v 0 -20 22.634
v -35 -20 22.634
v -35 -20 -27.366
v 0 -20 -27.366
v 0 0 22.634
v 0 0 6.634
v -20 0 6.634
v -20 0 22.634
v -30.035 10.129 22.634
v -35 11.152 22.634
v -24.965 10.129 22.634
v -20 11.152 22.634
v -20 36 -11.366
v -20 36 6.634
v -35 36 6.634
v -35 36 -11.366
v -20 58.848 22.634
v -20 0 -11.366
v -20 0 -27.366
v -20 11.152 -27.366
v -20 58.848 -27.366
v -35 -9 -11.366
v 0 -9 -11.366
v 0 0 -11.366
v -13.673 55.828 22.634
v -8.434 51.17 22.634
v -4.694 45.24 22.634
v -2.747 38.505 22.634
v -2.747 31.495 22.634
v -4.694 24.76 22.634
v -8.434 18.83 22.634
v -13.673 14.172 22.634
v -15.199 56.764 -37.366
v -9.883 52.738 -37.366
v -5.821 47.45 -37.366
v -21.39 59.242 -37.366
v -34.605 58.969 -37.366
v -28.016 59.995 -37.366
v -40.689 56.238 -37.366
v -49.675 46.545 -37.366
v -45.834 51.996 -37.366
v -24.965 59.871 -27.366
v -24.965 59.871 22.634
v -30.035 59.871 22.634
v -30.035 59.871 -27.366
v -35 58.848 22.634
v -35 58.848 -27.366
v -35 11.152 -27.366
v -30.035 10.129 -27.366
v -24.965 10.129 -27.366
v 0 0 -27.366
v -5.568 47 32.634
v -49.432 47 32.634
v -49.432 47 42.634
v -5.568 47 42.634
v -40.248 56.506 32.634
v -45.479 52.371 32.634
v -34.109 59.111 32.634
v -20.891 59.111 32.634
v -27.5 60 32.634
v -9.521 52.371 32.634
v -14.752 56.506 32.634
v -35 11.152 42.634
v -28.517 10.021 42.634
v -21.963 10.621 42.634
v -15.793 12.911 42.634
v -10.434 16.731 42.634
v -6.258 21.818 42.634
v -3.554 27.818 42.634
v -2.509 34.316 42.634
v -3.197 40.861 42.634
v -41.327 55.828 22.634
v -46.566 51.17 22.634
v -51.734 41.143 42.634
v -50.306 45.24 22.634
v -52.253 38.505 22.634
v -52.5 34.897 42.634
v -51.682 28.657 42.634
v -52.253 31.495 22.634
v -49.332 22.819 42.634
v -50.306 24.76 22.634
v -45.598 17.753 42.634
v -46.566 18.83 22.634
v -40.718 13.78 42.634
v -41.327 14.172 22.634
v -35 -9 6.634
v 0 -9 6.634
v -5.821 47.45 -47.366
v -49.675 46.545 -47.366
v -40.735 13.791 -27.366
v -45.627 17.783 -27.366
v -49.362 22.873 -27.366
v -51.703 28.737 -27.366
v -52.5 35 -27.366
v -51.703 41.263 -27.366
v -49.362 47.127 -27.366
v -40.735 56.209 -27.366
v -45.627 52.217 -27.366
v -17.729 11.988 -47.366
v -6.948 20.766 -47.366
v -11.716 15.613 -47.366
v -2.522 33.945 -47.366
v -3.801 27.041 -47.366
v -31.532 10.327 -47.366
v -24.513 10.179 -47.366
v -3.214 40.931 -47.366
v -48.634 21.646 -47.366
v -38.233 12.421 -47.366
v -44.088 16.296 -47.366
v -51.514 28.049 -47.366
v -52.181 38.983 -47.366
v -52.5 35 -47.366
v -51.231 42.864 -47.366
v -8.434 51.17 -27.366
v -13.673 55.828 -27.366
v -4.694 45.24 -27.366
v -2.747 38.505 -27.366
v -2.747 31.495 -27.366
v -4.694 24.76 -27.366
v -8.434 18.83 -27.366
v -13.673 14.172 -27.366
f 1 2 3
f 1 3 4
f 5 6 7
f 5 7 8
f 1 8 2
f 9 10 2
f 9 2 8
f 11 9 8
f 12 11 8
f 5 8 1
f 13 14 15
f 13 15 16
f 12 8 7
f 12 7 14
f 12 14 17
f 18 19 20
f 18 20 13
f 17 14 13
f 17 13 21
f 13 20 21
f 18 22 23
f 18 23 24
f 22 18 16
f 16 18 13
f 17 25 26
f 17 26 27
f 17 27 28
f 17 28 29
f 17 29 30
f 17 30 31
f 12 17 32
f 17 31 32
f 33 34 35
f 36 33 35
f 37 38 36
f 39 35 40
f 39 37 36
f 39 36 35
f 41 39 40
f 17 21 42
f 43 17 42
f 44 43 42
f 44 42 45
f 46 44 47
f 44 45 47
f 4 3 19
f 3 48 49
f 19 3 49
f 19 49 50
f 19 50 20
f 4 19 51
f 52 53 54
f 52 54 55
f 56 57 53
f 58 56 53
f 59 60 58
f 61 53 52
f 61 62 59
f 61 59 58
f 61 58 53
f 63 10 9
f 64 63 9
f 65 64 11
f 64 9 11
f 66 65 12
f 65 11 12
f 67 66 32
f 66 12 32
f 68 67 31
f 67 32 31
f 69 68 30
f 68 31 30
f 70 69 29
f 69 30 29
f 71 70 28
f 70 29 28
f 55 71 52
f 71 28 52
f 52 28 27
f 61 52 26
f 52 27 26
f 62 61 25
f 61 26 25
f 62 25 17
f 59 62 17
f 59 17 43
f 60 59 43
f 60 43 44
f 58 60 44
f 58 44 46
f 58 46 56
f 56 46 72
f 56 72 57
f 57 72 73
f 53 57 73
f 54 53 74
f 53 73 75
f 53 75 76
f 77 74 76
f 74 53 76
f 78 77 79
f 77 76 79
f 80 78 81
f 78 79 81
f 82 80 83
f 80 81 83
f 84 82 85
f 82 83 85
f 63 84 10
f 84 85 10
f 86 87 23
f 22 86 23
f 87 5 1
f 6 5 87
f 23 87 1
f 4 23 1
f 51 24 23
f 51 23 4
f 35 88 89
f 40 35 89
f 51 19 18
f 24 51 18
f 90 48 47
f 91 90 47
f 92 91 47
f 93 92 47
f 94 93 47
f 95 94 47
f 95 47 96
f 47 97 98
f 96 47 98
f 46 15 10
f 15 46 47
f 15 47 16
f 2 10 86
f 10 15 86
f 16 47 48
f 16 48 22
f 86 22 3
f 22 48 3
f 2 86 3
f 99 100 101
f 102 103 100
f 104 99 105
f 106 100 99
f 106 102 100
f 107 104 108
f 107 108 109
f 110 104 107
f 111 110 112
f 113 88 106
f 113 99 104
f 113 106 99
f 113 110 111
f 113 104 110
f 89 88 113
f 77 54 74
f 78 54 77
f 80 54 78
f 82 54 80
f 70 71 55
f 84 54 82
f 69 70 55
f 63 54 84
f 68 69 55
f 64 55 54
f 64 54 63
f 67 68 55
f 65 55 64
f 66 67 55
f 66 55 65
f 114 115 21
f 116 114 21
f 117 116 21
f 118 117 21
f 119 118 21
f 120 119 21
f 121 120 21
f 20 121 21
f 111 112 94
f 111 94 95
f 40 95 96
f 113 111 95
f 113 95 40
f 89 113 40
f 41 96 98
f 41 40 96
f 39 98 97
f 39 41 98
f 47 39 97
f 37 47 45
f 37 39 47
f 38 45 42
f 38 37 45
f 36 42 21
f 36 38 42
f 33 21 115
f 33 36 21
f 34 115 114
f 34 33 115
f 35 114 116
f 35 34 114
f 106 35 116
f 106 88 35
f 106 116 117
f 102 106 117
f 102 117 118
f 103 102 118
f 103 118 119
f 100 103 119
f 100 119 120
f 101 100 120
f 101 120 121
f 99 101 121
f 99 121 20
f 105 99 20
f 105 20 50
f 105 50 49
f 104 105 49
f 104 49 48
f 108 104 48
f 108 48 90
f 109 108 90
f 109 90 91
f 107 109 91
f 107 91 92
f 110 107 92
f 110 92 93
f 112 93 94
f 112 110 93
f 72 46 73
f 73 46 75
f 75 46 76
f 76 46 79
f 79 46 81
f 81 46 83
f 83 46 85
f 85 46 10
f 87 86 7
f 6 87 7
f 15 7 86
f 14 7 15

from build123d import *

# Parameters (mm, degrees)
BOSS_EXTRUDE1_DEPTH = 20
BOSS_EXTRUDE2_DEPTH = 50
SKETCH3_W           = 18
SKETCH3_H           = 45
CUT_EXTRUDE1_DEPTH  = 50
SKETCH4_R           = 25
BOSS_EXTRUDE3_DEPTH = 20
CUT_EXTRUDE2_START  = -10
CUT_EXTRUDE2_DEPTH  = 10
BOSS_EXTRUDE4_START = 50
BOSS_EXTRUDE4_DEPTH = 50
BOSS_EXTRUDE5_START = 20
SKETCH7_R           = 25
BOSS_EXTRUDE5_DEPTH = 20
CUT_EXTRUDE3_DEPTH  = 10


with BuildPart() as part:
    # Sketch1 → Boss-Extrude1 (new body)
    with BuildSketch(Plane(origin=(0, 0, 0), x_dir=(0, 0, -1), z_dir=(1, 0, 0))):
        Polygon((-22.633744856, 0), (-22.633744856, -20), (27.366255144, -20), (27.366255144, 0), (11.366255144, 0), (11.366255144, -9), (-6.633744856, -9), (-6.633744856, 0), align=None)
    extrude(amount=-BOSS_EXTRUDE1_DEPTH)

    # Sketch2 → Boss-Extrude2 (add)
    with BuildSketch(Plane.XY.offset(22.633744856)):
        Polygon((-20, 0), (-20, 54), (-35, 54), (-35, -20), (-20, -20), align=None)
    extrude(amount=-BOSS_EXTRUDE2_DEPTH)

    # Sketch3 → Cut-Extrude1 (cut)
    with BuildSketch(Plane(origin=(-20, 0, 0), x_dir=(0, 0, -1), z_dir=(1, 0, 0))):
        with Locations((2.366255144, 13.5)):
            Rectangle(SKETCH3_W, SKETCH3_H)
    extrude(amount=-CUT_EXTRUDE1_DEPTH, mode=Mode.SUBTRACT)

    # Sketch4 → Boss-Extrude3 (add)
    with BuildSketch(Plane.XY.offset(22.633744856)):
        with Locations(Location((-27.5, 35, 0), (0, 0, 252.542396876))):
            Circle(SKETCH4_R)
    extrude(amount=BOSS_EXTRUDE3_DEPTH)

    # Sketch5 → Cut-Extrude2 (cut)
    with BuildSketch(Plane.XY.offset(42.633744856).offset(CUT_EXTRUDE2_START)):
        with BuildLine():
            Line((-49.431712199, 47), (-5.568287801, 47))
            ThreePointArc((-5.568287801, 47), (-27.5, 60), (-49.431712199, 47))
        make_face()
    extrude(amount=CUT_EXTRUDE2_DEPTH, mode=Mode.SUBTRACT)

    # Sketch6 → Boss-Extrude4 (add)
    with BuildSketch(Plane(origin=(0, 0, 22.633744856), x_dir=(-1, 0, 0), z_dir=(0, 0, -1)).offset(BOSS_EXTRUDE4_START)):
        with BuildLine():
            Line((20, 54), (20, 58.848480035))
            ThreePointArc((20, 58.848480035), (27.5, 60), (35, 58.848480035))
            Line((35, 58.848480035), (35, 54))
            Line((35, 54), (20, 54))
        make_face()
    extrude(amount=-BOSS_EXTRUDE4_DEPTH)

    # Sketch7 → Boss-Extrude5 (add)
    with BuildSketch(Plane(origin=(0, 0, -27.366255144), x_dir=(-1, 0, 0), z_dir=(0, 0, -1)).offset(BOSS_EXTRUDE5_START)):
        with Locations((27.5, 35)):
            Circle(SKETCH7_R)
    extrude(amount=-BOSS_EXTRUDE5_DEPTH)

    # Sketch8 → Cut-Extrude3 (cut)
    with BuildSketch(Plane(origin=(0, 0, -47.366255144), x_dir=(-1, 0, 0), z_dir=(0, 0, -1))):
        with BuildLine():
            Line((5.820728213, 47.450268061), (49.674802071, 46.544615764))
            ThreePointArc((49.674802071, 46.544615764), (28.016177379, 59.99467065), (5.820728213, 47.450268061))
        make_face()
    extrude(amount=-CUT_EXTRUDE3_DEPTH, mode=Mode.SUBTRACT)


solid = part.part
